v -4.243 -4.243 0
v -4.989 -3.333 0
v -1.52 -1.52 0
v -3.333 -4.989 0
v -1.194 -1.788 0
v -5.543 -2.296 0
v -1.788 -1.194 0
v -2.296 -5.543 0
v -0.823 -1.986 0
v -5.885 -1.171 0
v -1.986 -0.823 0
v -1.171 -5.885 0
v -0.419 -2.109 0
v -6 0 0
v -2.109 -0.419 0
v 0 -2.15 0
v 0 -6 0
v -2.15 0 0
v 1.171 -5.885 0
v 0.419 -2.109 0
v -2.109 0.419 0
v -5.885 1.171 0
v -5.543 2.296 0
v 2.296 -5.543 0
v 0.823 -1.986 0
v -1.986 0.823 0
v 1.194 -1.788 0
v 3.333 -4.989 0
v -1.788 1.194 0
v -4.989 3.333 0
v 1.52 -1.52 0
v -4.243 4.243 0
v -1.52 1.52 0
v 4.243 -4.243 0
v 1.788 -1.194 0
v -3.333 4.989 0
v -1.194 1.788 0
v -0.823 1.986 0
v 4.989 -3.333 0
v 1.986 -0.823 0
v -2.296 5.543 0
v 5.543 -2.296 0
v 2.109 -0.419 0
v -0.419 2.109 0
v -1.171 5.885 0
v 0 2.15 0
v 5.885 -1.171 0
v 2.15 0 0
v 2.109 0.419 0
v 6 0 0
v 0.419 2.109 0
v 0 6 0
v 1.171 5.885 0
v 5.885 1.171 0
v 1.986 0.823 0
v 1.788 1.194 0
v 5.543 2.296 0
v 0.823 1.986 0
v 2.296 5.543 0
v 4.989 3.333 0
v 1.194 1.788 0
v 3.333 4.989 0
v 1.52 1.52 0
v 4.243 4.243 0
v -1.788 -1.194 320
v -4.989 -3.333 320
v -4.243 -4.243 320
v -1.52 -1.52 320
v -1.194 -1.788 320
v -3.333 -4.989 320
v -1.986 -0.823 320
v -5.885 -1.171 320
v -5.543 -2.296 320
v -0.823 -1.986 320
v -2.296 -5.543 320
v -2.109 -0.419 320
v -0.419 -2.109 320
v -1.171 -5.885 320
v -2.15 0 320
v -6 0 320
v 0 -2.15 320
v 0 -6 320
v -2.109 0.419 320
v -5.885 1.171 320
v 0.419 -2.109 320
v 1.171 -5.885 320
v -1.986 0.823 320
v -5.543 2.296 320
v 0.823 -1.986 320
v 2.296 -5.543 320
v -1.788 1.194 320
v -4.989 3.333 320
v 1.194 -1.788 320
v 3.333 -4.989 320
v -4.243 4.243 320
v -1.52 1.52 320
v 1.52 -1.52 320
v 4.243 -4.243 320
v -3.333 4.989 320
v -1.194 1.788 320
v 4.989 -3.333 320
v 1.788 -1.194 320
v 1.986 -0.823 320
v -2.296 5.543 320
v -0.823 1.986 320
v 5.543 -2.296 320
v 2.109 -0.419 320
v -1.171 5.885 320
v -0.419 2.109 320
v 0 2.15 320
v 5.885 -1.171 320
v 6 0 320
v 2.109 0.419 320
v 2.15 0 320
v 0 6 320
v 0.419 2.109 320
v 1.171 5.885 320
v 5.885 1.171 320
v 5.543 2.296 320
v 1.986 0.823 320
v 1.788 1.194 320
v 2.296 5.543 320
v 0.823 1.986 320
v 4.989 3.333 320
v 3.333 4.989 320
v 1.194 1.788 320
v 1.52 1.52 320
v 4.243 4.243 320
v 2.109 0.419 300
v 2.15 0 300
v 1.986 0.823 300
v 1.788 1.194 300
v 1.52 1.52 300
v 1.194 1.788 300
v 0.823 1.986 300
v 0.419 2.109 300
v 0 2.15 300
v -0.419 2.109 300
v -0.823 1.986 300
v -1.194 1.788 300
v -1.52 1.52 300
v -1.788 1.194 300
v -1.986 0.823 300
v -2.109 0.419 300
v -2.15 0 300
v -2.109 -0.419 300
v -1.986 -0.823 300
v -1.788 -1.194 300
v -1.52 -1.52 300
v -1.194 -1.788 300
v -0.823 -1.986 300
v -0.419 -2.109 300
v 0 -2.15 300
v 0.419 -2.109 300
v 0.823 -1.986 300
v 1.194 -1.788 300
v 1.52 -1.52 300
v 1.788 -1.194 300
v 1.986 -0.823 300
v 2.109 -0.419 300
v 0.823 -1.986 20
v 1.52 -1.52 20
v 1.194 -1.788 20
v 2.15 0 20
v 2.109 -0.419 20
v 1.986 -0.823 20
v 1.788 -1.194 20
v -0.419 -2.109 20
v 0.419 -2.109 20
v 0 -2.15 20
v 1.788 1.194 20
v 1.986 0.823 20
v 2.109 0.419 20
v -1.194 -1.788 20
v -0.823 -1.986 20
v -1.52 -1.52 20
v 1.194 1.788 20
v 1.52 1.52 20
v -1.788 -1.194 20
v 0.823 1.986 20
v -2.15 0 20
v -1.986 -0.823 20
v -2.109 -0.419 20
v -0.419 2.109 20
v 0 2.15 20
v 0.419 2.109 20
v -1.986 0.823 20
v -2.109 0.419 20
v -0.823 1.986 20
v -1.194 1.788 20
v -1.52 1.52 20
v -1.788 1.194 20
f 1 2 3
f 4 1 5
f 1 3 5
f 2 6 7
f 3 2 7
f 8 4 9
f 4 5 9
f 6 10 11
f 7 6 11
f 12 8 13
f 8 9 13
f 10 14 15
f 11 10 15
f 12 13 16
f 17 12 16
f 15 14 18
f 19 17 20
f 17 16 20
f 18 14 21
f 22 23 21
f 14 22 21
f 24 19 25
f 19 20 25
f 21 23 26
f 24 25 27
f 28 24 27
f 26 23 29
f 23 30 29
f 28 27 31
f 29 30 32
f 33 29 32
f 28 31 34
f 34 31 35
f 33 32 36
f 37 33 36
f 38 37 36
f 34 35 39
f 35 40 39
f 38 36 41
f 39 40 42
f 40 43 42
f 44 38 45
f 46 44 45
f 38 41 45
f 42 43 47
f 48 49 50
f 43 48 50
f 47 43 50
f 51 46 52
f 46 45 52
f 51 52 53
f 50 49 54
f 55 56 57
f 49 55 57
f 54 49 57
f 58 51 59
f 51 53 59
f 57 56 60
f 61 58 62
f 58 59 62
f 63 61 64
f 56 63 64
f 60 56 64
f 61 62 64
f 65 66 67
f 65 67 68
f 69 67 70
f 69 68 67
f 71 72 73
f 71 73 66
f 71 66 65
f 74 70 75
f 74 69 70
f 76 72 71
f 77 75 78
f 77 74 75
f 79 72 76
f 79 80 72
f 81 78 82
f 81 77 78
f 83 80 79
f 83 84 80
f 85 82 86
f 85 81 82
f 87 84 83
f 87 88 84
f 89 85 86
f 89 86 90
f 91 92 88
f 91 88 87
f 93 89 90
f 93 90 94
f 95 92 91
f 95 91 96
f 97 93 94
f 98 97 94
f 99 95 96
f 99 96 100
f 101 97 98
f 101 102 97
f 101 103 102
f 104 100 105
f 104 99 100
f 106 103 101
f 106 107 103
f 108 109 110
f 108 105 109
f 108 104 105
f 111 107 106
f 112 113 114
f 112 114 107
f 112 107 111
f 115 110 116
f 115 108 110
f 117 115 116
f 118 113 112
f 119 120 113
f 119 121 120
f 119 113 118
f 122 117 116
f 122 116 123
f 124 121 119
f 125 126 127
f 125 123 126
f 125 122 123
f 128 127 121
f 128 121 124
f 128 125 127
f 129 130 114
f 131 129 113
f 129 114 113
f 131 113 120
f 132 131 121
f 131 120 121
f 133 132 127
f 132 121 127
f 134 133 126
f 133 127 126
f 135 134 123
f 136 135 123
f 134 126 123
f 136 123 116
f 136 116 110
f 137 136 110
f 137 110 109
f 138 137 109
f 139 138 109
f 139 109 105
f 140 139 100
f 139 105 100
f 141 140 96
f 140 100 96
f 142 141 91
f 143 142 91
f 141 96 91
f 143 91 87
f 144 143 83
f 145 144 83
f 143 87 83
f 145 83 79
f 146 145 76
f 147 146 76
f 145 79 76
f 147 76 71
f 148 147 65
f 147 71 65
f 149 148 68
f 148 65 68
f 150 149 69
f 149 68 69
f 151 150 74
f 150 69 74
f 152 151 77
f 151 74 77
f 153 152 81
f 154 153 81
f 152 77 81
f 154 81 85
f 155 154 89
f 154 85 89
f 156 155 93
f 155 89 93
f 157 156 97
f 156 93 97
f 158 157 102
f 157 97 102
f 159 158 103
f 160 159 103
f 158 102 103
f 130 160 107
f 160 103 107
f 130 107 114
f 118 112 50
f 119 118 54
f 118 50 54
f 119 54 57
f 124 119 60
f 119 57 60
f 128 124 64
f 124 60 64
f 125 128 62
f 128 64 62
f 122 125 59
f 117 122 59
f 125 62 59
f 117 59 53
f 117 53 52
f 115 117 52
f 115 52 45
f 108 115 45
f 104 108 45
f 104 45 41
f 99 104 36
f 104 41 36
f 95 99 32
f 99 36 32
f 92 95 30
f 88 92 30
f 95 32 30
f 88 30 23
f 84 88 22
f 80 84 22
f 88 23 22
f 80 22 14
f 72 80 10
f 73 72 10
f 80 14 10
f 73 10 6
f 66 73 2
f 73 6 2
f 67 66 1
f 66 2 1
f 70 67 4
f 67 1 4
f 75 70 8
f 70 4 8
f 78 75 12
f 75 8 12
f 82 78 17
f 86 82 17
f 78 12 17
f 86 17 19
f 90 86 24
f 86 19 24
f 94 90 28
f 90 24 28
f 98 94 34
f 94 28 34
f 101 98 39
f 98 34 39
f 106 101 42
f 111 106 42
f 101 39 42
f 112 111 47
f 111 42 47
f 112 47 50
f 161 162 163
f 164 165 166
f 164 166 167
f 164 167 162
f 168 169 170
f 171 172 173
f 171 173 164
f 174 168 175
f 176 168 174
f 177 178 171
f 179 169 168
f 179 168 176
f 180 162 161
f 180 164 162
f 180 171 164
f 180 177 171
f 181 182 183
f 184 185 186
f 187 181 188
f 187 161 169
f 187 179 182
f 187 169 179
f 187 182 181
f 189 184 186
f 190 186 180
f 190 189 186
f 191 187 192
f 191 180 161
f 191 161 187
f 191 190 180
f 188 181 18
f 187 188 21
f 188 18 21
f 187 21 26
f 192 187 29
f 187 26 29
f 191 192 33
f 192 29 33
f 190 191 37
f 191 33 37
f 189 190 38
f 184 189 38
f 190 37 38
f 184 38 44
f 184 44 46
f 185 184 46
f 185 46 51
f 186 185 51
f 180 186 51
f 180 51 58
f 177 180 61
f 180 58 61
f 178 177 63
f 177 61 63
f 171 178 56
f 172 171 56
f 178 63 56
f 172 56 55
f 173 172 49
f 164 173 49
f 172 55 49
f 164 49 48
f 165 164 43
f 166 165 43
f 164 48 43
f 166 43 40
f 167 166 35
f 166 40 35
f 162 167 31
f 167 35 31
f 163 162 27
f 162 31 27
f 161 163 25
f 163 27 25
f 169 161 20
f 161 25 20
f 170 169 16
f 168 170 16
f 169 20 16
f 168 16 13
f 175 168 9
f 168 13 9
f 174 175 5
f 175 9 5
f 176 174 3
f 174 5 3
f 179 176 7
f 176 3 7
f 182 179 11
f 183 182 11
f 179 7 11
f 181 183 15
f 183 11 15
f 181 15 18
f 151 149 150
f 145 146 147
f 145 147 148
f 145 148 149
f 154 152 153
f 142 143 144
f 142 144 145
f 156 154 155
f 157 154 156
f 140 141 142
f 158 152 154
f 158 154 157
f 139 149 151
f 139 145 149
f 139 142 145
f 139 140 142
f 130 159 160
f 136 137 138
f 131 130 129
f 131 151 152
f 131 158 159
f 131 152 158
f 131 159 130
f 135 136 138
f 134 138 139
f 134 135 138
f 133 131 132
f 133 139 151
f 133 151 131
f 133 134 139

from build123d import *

# Parameters (mm, degrees)
SKETCH1_R           = 6
BOSS_EXTRUDE1_DEPTH = 320
SKETCH2_R           = 2.15
CUT_EXTRUDE1_DEPTH  = 20
SKETCH3_R           = 2.15
CUT_EXTRUDE2_DEPTH  = 20


with BuildPart() as part:
    # Sketch1 → Boss-Extrude1 (new body)
    with BuildSketch(Plane.XY):
        Circle(SKETCH1_R)
    extrude(amount=BOSS_EXTRUDE1_DEPTH)

    # Sketch2 → Cut-Extrude1 (cut)
    with BuildSketch(Plane.XY.offset(320)):
        Circle(SKETCH2_R)
    extrude(amount=-CUT_EXTRUDE1_DEPTH, mode=Mode.SUBTRACT)

    # Sketch3 → Cut-Extrude2 (cut)
    with BuildSketch(Plane(origin=(0, 0, 0), x_dir=(-1, 0, 0), z_dir=(0, 0, -1))):
        Circle(SKETCH3_R)
    extrude(amount=-CUT_EXTRUDE2_DEPTH, mode=Mode.SUBTRACT)


solid = part.part
